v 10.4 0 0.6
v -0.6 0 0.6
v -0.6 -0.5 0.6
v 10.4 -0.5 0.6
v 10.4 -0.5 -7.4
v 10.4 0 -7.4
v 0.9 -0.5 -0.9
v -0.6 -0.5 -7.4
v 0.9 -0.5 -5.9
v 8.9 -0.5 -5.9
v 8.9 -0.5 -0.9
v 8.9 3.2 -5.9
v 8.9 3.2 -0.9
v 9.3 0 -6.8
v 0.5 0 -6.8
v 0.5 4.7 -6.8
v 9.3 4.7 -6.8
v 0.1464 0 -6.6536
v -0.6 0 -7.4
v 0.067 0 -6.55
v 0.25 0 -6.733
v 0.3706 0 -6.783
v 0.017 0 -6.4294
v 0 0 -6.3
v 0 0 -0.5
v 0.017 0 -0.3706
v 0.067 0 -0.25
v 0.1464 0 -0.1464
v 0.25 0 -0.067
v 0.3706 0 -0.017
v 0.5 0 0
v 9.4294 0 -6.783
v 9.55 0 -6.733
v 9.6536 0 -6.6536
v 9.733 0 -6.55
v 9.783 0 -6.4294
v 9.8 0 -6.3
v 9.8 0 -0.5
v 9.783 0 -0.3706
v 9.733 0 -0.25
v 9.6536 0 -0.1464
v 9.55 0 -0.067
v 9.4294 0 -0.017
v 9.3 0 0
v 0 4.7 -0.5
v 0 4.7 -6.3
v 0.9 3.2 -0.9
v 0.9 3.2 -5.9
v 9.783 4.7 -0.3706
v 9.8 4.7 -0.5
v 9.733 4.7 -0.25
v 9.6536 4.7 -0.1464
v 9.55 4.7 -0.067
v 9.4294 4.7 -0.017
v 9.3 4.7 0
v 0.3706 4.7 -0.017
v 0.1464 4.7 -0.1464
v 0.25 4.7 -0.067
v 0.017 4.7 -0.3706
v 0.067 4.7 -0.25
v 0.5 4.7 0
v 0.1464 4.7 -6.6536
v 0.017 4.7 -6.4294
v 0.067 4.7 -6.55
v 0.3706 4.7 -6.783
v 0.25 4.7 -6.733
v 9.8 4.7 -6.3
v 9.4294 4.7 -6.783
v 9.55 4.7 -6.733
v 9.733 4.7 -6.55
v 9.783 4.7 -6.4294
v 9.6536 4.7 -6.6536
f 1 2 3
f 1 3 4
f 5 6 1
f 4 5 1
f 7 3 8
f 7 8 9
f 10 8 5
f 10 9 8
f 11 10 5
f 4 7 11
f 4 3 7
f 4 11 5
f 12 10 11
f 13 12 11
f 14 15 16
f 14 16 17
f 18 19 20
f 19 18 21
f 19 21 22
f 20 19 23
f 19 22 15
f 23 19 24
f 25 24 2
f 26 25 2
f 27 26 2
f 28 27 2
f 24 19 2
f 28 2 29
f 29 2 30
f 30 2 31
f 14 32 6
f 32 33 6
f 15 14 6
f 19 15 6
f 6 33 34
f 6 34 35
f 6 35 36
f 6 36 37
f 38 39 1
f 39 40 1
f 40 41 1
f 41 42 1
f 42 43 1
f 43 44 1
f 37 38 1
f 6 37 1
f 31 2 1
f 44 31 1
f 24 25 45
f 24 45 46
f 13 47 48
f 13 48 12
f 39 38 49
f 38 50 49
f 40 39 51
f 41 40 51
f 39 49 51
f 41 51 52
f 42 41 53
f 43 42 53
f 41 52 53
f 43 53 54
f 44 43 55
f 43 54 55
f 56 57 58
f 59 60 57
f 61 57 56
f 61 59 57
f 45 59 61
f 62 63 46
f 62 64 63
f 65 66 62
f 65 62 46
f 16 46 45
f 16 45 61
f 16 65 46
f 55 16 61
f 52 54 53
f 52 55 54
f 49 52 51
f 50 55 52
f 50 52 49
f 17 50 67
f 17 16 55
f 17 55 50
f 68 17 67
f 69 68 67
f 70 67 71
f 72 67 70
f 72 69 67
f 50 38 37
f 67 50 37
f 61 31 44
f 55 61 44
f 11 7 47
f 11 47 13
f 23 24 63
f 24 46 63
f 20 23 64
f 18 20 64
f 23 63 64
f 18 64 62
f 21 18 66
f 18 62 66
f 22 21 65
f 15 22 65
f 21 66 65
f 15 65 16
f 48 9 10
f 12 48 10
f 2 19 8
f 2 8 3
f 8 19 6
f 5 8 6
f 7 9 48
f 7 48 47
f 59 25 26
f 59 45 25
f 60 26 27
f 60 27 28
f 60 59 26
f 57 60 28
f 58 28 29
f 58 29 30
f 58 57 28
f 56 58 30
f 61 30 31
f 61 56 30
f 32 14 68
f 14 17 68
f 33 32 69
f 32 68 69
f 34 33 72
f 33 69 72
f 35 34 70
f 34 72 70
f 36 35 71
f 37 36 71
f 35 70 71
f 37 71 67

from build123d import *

# Parameters (mm, degrees)
SKETCH1_W           = 9.8
SKETCH1_H           = 6.8
BOSS_EXTRUDE1_DEPTH = 4.7
SKETCH2_W           = 11
SKETCH2_H           = 8
BOSS_EXTRUDE2_DEPTH = 0.5
SKETCH3_W           = 8
SKETCH3_H           = 5
CUT_EXTRUDE1_DEPTH  = 3.7
FILLET1_R           = 0.5


with BuildPart() as part:
    # Sketch1 → Boss-Extrude1 (new body)
    with BuildSketch(Plane(origin=(0, 0, 0), x_dir=(1, 0, 0), z_dir=(0, 1, 0))):
        with Locations((4.9, 3.4)):
            Rectangle(SKETCH1_W, SKETCH1_H)
    extrude(amount=BOSS_EXTRUDE1_DEPTH)

    # Sketch2 → Boss-Extrude2 (add)
    with BuildSketch(Plane.XZ):
        with Locations((4.9, -3.4)):
            Rectangle(SKETCH2_W, SKETCH2_H)
    extrude(amount=BOSS_EXTRUDE2_DEPTH)

    # Sketch3 → Cut-Extrude1 (cut)
    with BuildSketch(Plane.XZ.offset(0.5)):
        with Locations((4.9, -3.4)):
            Rectangle(SKETCH3_W, SKETCH3_H)
    extrude(amount=-CUT_EXTRUDE1_DEPTH, mode=Mode.SUBTRACT)

    # Fillet1
    fillet1_edges = [part.edges().sort_by_distance(p)[0] for p in [
        (0, 2.35, -6.8),
        (9.8, 2.35, -6.8),
        (9.8, 2.35, 0),
        (0, 2.35, 0),
    ]]
    fillet(fillet1_edges, radius=FILLET1_R)


solid = part.part
